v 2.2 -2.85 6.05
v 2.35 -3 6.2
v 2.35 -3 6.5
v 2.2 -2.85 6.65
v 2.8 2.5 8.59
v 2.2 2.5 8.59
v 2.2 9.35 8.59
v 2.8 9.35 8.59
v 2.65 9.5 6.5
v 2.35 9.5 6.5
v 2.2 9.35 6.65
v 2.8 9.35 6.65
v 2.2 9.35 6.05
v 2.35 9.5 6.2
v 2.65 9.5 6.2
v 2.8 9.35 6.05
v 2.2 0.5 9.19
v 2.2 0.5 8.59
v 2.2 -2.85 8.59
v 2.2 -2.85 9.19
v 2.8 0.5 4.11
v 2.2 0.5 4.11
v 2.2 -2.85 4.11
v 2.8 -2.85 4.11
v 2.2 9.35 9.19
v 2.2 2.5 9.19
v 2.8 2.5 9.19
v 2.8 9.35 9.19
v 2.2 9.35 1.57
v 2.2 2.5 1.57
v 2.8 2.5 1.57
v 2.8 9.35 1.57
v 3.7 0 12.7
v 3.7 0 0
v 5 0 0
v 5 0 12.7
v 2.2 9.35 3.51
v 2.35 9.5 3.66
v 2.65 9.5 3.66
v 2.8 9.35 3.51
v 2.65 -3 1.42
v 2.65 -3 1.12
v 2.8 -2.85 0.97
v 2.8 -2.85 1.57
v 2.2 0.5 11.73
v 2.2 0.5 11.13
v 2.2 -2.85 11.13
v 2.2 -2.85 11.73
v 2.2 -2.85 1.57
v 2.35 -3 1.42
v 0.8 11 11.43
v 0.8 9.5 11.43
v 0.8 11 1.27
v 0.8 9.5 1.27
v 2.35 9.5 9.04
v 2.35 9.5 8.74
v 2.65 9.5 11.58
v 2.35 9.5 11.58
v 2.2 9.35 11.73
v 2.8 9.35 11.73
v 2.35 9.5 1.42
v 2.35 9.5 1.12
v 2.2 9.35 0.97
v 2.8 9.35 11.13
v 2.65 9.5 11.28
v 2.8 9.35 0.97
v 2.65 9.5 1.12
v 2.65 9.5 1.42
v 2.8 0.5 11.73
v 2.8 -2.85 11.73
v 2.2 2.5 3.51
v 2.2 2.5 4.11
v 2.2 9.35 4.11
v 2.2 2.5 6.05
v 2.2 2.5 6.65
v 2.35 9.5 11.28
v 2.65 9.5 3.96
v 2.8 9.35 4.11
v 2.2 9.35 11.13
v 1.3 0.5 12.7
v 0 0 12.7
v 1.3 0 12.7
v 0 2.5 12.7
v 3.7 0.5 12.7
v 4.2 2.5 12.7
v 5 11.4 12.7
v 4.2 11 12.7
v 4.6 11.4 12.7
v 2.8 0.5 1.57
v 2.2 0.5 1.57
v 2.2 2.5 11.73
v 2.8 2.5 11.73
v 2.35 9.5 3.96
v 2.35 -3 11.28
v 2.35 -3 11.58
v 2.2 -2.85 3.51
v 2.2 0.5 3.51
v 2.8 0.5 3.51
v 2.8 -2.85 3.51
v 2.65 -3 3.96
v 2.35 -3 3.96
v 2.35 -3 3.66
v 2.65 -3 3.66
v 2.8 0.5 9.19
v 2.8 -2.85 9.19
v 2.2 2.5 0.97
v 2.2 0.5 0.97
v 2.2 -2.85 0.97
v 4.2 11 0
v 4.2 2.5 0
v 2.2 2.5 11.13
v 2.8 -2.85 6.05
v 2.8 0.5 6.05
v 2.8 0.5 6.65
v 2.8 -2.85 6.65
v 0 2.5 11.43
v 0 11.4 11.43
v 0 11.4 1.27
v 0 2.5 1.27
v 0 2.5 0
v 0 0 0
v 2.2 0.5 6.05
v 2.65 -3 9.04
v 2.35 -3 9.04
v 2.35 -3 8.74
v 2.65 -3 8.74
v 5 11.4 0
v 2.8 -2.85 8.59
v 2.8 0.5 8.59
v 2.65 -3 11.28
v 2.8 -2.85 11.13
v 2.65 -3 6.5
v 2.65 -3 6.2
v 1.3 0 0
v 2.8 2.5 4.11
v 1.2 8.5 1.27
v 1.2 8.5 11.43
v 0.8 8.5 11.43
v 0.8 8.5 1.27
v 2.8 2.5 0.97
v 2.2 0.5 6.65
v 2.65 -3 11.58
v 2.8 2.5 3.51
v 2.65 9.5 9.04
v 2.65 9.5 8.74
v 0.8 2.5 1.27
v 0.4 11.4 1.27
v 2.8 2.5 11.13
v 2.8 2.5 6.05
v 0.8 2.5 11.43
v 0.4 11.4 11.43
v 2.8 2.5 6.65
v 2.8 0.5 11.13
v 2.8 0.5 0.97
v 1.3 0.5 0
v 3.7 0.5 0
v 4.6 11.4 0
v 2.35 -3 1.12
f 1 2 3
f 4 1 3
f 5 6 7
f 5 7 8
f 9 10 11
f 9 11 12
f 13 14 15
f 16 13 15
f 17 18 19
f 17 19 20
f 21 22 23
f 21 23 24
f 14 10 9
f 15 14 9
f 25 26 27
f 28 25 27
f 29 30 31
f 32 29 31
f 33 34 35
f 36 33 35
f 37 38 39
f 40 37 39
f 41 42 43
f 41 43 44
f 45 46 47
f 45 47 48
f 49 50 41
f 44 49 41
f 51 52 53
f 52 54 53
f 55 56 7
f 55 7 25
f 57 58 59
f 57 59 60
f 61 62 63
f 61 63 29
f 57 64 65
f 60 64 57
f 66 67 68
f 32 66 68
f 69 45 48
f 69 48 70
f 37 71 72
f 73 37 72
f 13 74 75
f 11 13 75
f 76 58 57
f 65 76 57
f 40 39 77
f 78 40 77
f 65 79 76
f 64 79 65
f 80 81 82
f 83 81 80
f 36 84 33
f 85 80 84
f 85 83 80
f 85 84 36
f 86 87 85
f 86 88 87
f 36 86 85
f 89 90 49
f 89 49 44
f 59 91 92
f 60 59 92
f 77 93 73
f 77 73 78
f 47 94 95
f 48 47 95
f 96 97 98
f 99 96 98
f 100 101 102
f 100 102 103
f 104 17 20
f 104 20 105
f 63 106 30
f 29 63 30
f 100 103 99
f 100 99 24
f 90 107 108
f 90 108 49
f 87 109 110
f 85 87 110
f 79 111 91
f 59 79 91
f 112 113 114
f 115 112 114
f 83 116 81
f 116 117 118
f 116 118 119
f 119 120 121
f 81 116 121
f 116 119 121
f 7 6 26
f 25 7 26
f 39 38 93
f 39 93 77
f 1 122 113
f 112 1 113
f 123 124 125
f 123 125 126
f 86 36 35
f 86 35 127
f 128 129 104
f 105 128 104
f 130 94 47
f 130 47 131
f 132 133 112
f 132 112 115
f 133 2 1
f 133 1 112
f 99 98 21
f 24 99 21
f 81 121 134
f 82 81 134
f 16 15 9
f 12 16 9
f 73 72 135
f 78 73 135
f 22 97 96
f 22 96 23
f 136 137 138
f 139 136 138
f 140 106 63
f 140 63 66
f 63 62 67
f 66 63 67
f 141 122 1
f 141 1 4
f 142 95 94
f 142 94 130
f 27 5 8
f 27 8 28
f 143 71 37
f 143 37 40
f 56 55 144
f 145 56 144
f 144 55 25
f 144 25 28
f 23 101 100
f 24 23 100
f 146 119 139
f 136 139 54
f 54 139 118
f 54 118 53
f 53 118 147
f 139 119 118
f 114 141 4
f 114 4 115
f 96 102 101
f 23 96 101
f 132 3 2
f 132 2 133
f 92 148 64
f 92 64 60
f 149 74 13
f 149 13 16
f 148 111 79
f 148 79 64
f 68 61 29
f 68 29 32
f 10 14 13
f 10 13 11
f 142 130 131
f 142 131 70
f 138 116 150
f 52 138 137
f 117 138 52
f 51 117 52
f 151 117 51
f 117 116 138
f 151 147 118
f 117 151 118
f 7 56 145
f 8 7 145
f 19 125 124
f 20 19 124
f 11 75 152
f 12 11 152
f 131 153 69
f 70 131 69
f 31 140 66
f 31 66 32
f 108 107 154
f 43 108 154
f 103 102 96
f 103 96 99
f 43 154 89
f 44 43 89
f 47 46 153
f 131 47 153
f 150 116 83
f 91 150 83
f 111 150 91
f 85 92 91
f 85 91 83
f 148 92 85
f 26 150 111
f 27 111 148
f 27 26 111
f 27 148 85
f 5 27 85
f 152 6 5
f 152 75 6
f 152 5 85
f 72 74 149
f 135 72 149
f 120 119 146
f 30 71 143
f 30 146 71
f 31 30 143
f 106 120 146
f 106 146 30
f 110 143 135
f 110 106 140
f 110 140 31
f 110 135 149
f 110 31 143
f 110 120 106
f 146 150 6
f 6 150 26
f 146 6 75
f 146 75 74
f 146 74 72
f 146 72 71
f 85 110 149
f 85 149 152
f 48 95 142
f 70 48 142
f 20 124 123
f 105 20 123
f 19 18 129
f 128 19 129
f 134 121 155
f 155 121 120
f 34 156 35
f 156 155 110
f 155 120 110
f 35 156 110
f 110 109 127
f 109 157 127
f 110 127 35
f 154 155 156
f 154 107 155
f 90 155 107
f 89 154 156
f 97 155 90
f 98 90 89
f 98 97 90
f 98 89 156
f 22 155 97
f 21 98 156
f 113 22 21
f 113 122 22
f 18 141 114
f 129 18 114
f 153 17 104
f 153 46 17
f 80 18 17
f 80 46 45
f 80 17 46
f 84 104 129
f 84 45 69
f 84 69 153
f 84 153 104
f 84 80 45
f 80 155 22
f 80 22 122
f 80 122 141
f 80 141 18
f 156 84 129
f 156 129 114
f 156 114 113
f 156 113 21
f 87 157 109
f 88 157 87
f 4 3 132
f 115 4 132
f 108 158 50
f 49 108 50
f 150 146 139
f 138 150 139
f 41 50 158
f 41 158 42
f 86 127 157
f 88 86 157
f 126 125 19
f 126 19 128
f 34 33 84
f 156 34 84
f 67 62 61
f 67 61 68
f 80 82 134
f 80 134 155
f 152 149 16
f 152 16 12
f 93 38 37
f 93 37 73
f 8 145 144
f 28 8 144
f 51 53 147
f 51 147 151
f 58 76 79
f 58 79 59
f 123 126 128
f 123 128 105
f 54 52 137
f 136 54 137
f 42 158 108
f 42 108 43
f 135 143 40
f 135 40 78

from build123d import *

# Parameters (mm, degrees)
BOSS_EXTRU_1_DEPTH      = 12.7
ESQUISSE3_W             = 0.8
ESQUISSE3_H             = 1.27
ENL_V_MAT_EXTRU_1_DEPTH = 8.9
ESQUISSE4_W             = 2.4
ESQUISSE4_H             = 0.5
ENL_V_MAT_EXTRU_2_DEPTH = 13.7
ESQUISSE2_W             = 0.6
ESQUISSE2_H             = 0.6
BOSS_EXTRU_2_DEPTH      = 3.5
BOSS_EXTRU_2_DEPTH_BACK = 9
BOSS_EXTRU_3_DEPTH      = 10.16
CHANFREIN4_SIZE         = 0.15
CHANFREIN5_SIZE         = 0.4


with BuildPart() as part:
    # Esquisse1 → Boss.-Extru.1 (new body)
    with BuildSketch(Plane.XY):
        Polygon((0, 11.4), (0, 0), (5, 0), (5, 11.4), (4.2, 11.4), (4.2, 2.5), (0.8, 2.5), (0.8, 11.4), align=None)
    extrude(amount=BOSS_EXTRU_1_DEPTH)

    # Esquisse3 → Enlèv. mat.-Extru.1 (cut)
    with BuildSketch(Plane(origin=(0, 11.4, 0), x_dir=(1, 0, 0), z_dir=(0, 1, 0))):
        with Locations((0.4, -0.635)):
            Rectangle(ESQUISSE3_W, ESQUISSE3_H)
        with Locations((0.4, -12.065)):
            Rectangle(ESQUISSE3_W, ESQUISSE3_H)
    extrude(amount=-ENL_V_MAT_EXTRU_1_DEPTH, mode=Mode.SUBTRACT)

    # Esquisse4 → Enlèv. mat.-Extru.2 (cut, through all)
    with BuildSketch(Plane.XY.offset(12.7)):
        with Locations((2.5, 0.25)):
            Rectangle(ESQUISSE4_W, ESQUISSE4_H)
    extrude(amount=-ENL_V_MAT_EXTRU_2_DEPTH, mode=Mode.SUBTRACT)

    # Esquisse2 → Boss.-Extru.2 (add, two sides)
    with BuildSketch(Plane.XZ.offset(-0.5)) as boss_extru_2_sk:
        with Locations((2.5, 11.43)):
            Rectangle(ESQUISSE2_W, ESQUISSE2_H)
        with Locations((2.5, 1.27)):
            Rectangle(ESQUISSE2_W, ESQUISSE2_H)
        with Locations((2.5, 8.89)):
            Rectangle(ESQUISSE2_W, ESQUISSE2_H)
        with Locations((2.5, 6.35)):
            Rectangle(ESQUISSE2_W, ESQUISSE2_H)
        with Locations((2.5, 3.81)):
            Rectangle(ESQUISSE2_W, ESQUISSE2_H)
    extrude(amount=BOSS_EXTRU_2_DEPTH)
    extrude(boss_extru_2_sk.sketch, amount=-BOSS_EXTRU_2_DEPTH_BACK)

    # Esquisse5 → Boss.-Extru.3 (add)
    with BuildSketch(Plane.XY.offset(11.43)):
        Polygon((0.8, 9.5), (1.2, 8.5), (0.8, 8.5), align=None)
    extrude(amount=-BOSS_EXTRU_3_DEPTH)

    # Chanfrein4
    chanfrein4_edges = [part.edges().sort_by_distance(p)[0] for p in [
        (2.8, 9.5, 8.89),
        (2.5, 9.5, 8.59),
        (2.2, 9.5, 8.89),
        (2.5, 9.5, 9.19),
        (2.8, -3, 8.89),
        (2.5, -3, 9.19),
        (2.2, -3, 8.89),
        (2.5, -3, 8.59),
        (2.8, 9.5, 6.35),
        (2.5, 9.5, 6.05),
        (2.2, 9.5, 6.35),
        (2.5, 9.5, 6.65),
        (2.8, -3, 6.35),
        (2.5, -3, 6.65),
        (2.2, -3, 6.35),
        (2.5, -3, 6.05),
        (2.8, 9.5, 3.81),
        (2.5, 9.5, 3.51),
        (2.2, 9.5, 3.81),
        (2.5, 9.5, 4.11),
        (2.8, -3, 3.81),
        (2.5, -3, 4.11),
        (2.2, -3, 3.81),
        (2.5, -3, 3.51),
        (2.8, 9.5, 11.43),
        (2.5, 9.5, 11.13),
        (2.2, 9.5, 11.43),
        (2.5, 9.5, 11.73),
        (2.8, -3, 11.43),
        (2.5, -3, 11.73),
        (2.2, -3, 11.43),
        (2.5, -3, 11.13),
        (2.8, 9.5, 1.27),
        (2.5, 9.5, 0.97),
        (2.2, 9.5, 1.27),
        (2.5, 9.5, 1.57),
        (2.8, -3, 1.27),
        (2.5, -3, 1.57),
        (2.2, -3, 1.27),
        (2.5, -3, 0.97),
    ]]
    chamfer(chanfrein4_edges, length=CHANFREIN4_SIZE)

    # Chanfrein5
    chanfrein5_edges = [part.edges().sort_by_distance(p)[0] for p in [
        (4.2, 11.4, 6.35),
        (0.8, 11.4, 6.35),
    ]]
    chamfer(chanfrein5_edges, length=CHANFREIN5_SIZE)


solid = part.part
